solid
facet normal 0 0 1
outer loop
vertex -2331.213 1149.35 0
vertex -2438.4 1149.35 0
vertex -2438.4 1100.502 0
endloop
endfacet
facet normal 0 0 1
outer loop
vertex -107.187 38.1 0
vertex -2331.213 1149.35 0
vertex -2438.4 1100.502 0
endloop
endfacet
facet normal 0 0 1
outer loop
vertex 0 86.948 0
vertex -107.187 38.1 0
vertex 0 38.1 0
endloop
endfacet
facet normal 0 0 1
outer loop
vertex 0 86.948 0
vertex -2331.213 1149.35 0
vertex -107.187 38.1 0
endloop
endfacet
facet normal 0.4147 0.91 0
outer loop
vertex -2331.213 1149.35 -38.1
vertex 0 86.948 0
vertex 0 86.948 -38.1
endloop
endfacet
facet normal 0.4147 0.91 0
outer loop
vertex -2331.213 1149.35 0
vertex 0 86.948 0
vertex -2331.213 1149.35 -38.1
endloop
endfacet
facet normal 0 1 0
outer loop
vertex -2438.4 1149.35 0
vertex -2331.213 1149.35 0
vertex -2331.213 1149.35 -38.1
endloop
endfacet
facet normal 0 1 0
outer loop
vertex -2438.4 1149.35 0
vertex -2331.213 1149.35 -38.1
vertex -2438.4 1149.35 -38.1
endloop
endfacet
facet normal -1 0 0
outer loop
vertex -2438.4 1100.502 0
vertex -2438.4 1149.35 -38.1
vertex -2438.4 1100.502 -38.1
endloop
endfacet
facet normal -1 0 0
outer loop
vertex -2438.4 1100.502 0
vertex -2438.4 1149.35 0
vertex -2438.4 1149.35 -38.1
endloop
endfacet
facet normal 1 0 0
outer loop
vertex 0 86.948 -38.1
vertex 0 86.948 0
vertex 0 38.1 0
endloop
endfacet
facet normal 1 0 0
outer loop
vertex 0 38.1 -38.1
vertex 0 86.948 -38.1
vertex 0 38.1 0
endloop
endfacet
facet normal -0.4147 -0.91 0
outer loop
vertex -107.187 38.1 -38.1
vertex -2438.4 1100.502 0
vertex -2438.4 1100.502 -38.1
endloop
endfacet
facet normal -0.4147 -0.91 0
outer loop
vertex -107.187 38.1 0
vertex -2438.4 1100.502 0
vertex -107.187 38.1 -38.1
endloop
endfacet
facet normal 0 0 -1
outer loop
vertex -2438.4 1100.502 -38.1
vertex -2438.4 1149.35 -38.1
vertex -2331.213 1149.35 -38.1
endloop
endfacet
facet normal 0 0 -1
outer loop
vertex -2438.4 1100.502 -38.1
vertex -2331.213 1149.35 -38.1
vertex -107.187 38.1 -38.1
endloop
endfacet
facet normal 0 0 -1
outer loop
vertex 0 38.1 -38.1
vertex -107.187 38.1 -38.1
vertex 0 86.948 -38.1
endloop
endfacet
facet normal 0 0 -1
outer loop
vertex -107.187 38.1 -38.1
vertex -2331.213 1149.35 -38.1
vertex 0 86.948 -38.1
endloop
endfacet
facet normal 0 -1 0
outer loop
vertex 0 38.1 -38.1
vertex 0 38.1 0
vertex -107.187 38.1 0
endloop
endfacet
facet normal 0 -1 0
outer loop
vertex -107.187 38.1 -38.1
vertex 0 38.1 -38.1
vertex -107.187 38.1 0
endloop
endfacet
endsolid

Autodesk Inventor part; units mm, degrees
ref_plane "YZ Plane" through (0, 0, 0) normal (1, 0, 0) x (0, 1, 0)
ref_plane "XZ Plane" through (0, 0, 0) normal (0, 1, 0) x (-1, 0, 0)
ref_plane "XY Plane" through (0, 0, 0) normal (0, 0, 1) x (1, 0, 0)
sketch "Sketch1" plane through (0, 0, 0) normal (0, 0, 1) x (1, 0, 0)
  line L0 (0, 38.1) -> (-2438.4, 38.1) projected
  line L1 (0, 1149.35) -> (0, -1111.25) projected
  line L2 (0, 0) -> (-2438.4, 0) projected
  line L3 (-2438.4, 1149.35) -> (-2438.4, -1111.25) projected
  line L4 (0, 1149.35) -> (-2438.4, 1149.35) projected
  line L5 (0, 86.9483) -> (-2331.2129, 1149.35)
  line L6 (-2438.4, 1100.5017) -> (-107.1871, 38.1)
  line L7 (-2331.2129, 1149.35) -> (-2438.4, 1149.35)
  line L8 (-2438.4, 1100.5017) -> (-2438.4, 1149.35)
  line L9 (0, 86.9483) -> (0, 38.1)
  line L10 (-107.1871, 38.1) -> (0, 38.1)
extrude "Extrusion1" add sketch "Sketch1" against normal blind 38.1 contours L0 L6 L3 L4 L5 L1
properties part number "s48x2x4b"
